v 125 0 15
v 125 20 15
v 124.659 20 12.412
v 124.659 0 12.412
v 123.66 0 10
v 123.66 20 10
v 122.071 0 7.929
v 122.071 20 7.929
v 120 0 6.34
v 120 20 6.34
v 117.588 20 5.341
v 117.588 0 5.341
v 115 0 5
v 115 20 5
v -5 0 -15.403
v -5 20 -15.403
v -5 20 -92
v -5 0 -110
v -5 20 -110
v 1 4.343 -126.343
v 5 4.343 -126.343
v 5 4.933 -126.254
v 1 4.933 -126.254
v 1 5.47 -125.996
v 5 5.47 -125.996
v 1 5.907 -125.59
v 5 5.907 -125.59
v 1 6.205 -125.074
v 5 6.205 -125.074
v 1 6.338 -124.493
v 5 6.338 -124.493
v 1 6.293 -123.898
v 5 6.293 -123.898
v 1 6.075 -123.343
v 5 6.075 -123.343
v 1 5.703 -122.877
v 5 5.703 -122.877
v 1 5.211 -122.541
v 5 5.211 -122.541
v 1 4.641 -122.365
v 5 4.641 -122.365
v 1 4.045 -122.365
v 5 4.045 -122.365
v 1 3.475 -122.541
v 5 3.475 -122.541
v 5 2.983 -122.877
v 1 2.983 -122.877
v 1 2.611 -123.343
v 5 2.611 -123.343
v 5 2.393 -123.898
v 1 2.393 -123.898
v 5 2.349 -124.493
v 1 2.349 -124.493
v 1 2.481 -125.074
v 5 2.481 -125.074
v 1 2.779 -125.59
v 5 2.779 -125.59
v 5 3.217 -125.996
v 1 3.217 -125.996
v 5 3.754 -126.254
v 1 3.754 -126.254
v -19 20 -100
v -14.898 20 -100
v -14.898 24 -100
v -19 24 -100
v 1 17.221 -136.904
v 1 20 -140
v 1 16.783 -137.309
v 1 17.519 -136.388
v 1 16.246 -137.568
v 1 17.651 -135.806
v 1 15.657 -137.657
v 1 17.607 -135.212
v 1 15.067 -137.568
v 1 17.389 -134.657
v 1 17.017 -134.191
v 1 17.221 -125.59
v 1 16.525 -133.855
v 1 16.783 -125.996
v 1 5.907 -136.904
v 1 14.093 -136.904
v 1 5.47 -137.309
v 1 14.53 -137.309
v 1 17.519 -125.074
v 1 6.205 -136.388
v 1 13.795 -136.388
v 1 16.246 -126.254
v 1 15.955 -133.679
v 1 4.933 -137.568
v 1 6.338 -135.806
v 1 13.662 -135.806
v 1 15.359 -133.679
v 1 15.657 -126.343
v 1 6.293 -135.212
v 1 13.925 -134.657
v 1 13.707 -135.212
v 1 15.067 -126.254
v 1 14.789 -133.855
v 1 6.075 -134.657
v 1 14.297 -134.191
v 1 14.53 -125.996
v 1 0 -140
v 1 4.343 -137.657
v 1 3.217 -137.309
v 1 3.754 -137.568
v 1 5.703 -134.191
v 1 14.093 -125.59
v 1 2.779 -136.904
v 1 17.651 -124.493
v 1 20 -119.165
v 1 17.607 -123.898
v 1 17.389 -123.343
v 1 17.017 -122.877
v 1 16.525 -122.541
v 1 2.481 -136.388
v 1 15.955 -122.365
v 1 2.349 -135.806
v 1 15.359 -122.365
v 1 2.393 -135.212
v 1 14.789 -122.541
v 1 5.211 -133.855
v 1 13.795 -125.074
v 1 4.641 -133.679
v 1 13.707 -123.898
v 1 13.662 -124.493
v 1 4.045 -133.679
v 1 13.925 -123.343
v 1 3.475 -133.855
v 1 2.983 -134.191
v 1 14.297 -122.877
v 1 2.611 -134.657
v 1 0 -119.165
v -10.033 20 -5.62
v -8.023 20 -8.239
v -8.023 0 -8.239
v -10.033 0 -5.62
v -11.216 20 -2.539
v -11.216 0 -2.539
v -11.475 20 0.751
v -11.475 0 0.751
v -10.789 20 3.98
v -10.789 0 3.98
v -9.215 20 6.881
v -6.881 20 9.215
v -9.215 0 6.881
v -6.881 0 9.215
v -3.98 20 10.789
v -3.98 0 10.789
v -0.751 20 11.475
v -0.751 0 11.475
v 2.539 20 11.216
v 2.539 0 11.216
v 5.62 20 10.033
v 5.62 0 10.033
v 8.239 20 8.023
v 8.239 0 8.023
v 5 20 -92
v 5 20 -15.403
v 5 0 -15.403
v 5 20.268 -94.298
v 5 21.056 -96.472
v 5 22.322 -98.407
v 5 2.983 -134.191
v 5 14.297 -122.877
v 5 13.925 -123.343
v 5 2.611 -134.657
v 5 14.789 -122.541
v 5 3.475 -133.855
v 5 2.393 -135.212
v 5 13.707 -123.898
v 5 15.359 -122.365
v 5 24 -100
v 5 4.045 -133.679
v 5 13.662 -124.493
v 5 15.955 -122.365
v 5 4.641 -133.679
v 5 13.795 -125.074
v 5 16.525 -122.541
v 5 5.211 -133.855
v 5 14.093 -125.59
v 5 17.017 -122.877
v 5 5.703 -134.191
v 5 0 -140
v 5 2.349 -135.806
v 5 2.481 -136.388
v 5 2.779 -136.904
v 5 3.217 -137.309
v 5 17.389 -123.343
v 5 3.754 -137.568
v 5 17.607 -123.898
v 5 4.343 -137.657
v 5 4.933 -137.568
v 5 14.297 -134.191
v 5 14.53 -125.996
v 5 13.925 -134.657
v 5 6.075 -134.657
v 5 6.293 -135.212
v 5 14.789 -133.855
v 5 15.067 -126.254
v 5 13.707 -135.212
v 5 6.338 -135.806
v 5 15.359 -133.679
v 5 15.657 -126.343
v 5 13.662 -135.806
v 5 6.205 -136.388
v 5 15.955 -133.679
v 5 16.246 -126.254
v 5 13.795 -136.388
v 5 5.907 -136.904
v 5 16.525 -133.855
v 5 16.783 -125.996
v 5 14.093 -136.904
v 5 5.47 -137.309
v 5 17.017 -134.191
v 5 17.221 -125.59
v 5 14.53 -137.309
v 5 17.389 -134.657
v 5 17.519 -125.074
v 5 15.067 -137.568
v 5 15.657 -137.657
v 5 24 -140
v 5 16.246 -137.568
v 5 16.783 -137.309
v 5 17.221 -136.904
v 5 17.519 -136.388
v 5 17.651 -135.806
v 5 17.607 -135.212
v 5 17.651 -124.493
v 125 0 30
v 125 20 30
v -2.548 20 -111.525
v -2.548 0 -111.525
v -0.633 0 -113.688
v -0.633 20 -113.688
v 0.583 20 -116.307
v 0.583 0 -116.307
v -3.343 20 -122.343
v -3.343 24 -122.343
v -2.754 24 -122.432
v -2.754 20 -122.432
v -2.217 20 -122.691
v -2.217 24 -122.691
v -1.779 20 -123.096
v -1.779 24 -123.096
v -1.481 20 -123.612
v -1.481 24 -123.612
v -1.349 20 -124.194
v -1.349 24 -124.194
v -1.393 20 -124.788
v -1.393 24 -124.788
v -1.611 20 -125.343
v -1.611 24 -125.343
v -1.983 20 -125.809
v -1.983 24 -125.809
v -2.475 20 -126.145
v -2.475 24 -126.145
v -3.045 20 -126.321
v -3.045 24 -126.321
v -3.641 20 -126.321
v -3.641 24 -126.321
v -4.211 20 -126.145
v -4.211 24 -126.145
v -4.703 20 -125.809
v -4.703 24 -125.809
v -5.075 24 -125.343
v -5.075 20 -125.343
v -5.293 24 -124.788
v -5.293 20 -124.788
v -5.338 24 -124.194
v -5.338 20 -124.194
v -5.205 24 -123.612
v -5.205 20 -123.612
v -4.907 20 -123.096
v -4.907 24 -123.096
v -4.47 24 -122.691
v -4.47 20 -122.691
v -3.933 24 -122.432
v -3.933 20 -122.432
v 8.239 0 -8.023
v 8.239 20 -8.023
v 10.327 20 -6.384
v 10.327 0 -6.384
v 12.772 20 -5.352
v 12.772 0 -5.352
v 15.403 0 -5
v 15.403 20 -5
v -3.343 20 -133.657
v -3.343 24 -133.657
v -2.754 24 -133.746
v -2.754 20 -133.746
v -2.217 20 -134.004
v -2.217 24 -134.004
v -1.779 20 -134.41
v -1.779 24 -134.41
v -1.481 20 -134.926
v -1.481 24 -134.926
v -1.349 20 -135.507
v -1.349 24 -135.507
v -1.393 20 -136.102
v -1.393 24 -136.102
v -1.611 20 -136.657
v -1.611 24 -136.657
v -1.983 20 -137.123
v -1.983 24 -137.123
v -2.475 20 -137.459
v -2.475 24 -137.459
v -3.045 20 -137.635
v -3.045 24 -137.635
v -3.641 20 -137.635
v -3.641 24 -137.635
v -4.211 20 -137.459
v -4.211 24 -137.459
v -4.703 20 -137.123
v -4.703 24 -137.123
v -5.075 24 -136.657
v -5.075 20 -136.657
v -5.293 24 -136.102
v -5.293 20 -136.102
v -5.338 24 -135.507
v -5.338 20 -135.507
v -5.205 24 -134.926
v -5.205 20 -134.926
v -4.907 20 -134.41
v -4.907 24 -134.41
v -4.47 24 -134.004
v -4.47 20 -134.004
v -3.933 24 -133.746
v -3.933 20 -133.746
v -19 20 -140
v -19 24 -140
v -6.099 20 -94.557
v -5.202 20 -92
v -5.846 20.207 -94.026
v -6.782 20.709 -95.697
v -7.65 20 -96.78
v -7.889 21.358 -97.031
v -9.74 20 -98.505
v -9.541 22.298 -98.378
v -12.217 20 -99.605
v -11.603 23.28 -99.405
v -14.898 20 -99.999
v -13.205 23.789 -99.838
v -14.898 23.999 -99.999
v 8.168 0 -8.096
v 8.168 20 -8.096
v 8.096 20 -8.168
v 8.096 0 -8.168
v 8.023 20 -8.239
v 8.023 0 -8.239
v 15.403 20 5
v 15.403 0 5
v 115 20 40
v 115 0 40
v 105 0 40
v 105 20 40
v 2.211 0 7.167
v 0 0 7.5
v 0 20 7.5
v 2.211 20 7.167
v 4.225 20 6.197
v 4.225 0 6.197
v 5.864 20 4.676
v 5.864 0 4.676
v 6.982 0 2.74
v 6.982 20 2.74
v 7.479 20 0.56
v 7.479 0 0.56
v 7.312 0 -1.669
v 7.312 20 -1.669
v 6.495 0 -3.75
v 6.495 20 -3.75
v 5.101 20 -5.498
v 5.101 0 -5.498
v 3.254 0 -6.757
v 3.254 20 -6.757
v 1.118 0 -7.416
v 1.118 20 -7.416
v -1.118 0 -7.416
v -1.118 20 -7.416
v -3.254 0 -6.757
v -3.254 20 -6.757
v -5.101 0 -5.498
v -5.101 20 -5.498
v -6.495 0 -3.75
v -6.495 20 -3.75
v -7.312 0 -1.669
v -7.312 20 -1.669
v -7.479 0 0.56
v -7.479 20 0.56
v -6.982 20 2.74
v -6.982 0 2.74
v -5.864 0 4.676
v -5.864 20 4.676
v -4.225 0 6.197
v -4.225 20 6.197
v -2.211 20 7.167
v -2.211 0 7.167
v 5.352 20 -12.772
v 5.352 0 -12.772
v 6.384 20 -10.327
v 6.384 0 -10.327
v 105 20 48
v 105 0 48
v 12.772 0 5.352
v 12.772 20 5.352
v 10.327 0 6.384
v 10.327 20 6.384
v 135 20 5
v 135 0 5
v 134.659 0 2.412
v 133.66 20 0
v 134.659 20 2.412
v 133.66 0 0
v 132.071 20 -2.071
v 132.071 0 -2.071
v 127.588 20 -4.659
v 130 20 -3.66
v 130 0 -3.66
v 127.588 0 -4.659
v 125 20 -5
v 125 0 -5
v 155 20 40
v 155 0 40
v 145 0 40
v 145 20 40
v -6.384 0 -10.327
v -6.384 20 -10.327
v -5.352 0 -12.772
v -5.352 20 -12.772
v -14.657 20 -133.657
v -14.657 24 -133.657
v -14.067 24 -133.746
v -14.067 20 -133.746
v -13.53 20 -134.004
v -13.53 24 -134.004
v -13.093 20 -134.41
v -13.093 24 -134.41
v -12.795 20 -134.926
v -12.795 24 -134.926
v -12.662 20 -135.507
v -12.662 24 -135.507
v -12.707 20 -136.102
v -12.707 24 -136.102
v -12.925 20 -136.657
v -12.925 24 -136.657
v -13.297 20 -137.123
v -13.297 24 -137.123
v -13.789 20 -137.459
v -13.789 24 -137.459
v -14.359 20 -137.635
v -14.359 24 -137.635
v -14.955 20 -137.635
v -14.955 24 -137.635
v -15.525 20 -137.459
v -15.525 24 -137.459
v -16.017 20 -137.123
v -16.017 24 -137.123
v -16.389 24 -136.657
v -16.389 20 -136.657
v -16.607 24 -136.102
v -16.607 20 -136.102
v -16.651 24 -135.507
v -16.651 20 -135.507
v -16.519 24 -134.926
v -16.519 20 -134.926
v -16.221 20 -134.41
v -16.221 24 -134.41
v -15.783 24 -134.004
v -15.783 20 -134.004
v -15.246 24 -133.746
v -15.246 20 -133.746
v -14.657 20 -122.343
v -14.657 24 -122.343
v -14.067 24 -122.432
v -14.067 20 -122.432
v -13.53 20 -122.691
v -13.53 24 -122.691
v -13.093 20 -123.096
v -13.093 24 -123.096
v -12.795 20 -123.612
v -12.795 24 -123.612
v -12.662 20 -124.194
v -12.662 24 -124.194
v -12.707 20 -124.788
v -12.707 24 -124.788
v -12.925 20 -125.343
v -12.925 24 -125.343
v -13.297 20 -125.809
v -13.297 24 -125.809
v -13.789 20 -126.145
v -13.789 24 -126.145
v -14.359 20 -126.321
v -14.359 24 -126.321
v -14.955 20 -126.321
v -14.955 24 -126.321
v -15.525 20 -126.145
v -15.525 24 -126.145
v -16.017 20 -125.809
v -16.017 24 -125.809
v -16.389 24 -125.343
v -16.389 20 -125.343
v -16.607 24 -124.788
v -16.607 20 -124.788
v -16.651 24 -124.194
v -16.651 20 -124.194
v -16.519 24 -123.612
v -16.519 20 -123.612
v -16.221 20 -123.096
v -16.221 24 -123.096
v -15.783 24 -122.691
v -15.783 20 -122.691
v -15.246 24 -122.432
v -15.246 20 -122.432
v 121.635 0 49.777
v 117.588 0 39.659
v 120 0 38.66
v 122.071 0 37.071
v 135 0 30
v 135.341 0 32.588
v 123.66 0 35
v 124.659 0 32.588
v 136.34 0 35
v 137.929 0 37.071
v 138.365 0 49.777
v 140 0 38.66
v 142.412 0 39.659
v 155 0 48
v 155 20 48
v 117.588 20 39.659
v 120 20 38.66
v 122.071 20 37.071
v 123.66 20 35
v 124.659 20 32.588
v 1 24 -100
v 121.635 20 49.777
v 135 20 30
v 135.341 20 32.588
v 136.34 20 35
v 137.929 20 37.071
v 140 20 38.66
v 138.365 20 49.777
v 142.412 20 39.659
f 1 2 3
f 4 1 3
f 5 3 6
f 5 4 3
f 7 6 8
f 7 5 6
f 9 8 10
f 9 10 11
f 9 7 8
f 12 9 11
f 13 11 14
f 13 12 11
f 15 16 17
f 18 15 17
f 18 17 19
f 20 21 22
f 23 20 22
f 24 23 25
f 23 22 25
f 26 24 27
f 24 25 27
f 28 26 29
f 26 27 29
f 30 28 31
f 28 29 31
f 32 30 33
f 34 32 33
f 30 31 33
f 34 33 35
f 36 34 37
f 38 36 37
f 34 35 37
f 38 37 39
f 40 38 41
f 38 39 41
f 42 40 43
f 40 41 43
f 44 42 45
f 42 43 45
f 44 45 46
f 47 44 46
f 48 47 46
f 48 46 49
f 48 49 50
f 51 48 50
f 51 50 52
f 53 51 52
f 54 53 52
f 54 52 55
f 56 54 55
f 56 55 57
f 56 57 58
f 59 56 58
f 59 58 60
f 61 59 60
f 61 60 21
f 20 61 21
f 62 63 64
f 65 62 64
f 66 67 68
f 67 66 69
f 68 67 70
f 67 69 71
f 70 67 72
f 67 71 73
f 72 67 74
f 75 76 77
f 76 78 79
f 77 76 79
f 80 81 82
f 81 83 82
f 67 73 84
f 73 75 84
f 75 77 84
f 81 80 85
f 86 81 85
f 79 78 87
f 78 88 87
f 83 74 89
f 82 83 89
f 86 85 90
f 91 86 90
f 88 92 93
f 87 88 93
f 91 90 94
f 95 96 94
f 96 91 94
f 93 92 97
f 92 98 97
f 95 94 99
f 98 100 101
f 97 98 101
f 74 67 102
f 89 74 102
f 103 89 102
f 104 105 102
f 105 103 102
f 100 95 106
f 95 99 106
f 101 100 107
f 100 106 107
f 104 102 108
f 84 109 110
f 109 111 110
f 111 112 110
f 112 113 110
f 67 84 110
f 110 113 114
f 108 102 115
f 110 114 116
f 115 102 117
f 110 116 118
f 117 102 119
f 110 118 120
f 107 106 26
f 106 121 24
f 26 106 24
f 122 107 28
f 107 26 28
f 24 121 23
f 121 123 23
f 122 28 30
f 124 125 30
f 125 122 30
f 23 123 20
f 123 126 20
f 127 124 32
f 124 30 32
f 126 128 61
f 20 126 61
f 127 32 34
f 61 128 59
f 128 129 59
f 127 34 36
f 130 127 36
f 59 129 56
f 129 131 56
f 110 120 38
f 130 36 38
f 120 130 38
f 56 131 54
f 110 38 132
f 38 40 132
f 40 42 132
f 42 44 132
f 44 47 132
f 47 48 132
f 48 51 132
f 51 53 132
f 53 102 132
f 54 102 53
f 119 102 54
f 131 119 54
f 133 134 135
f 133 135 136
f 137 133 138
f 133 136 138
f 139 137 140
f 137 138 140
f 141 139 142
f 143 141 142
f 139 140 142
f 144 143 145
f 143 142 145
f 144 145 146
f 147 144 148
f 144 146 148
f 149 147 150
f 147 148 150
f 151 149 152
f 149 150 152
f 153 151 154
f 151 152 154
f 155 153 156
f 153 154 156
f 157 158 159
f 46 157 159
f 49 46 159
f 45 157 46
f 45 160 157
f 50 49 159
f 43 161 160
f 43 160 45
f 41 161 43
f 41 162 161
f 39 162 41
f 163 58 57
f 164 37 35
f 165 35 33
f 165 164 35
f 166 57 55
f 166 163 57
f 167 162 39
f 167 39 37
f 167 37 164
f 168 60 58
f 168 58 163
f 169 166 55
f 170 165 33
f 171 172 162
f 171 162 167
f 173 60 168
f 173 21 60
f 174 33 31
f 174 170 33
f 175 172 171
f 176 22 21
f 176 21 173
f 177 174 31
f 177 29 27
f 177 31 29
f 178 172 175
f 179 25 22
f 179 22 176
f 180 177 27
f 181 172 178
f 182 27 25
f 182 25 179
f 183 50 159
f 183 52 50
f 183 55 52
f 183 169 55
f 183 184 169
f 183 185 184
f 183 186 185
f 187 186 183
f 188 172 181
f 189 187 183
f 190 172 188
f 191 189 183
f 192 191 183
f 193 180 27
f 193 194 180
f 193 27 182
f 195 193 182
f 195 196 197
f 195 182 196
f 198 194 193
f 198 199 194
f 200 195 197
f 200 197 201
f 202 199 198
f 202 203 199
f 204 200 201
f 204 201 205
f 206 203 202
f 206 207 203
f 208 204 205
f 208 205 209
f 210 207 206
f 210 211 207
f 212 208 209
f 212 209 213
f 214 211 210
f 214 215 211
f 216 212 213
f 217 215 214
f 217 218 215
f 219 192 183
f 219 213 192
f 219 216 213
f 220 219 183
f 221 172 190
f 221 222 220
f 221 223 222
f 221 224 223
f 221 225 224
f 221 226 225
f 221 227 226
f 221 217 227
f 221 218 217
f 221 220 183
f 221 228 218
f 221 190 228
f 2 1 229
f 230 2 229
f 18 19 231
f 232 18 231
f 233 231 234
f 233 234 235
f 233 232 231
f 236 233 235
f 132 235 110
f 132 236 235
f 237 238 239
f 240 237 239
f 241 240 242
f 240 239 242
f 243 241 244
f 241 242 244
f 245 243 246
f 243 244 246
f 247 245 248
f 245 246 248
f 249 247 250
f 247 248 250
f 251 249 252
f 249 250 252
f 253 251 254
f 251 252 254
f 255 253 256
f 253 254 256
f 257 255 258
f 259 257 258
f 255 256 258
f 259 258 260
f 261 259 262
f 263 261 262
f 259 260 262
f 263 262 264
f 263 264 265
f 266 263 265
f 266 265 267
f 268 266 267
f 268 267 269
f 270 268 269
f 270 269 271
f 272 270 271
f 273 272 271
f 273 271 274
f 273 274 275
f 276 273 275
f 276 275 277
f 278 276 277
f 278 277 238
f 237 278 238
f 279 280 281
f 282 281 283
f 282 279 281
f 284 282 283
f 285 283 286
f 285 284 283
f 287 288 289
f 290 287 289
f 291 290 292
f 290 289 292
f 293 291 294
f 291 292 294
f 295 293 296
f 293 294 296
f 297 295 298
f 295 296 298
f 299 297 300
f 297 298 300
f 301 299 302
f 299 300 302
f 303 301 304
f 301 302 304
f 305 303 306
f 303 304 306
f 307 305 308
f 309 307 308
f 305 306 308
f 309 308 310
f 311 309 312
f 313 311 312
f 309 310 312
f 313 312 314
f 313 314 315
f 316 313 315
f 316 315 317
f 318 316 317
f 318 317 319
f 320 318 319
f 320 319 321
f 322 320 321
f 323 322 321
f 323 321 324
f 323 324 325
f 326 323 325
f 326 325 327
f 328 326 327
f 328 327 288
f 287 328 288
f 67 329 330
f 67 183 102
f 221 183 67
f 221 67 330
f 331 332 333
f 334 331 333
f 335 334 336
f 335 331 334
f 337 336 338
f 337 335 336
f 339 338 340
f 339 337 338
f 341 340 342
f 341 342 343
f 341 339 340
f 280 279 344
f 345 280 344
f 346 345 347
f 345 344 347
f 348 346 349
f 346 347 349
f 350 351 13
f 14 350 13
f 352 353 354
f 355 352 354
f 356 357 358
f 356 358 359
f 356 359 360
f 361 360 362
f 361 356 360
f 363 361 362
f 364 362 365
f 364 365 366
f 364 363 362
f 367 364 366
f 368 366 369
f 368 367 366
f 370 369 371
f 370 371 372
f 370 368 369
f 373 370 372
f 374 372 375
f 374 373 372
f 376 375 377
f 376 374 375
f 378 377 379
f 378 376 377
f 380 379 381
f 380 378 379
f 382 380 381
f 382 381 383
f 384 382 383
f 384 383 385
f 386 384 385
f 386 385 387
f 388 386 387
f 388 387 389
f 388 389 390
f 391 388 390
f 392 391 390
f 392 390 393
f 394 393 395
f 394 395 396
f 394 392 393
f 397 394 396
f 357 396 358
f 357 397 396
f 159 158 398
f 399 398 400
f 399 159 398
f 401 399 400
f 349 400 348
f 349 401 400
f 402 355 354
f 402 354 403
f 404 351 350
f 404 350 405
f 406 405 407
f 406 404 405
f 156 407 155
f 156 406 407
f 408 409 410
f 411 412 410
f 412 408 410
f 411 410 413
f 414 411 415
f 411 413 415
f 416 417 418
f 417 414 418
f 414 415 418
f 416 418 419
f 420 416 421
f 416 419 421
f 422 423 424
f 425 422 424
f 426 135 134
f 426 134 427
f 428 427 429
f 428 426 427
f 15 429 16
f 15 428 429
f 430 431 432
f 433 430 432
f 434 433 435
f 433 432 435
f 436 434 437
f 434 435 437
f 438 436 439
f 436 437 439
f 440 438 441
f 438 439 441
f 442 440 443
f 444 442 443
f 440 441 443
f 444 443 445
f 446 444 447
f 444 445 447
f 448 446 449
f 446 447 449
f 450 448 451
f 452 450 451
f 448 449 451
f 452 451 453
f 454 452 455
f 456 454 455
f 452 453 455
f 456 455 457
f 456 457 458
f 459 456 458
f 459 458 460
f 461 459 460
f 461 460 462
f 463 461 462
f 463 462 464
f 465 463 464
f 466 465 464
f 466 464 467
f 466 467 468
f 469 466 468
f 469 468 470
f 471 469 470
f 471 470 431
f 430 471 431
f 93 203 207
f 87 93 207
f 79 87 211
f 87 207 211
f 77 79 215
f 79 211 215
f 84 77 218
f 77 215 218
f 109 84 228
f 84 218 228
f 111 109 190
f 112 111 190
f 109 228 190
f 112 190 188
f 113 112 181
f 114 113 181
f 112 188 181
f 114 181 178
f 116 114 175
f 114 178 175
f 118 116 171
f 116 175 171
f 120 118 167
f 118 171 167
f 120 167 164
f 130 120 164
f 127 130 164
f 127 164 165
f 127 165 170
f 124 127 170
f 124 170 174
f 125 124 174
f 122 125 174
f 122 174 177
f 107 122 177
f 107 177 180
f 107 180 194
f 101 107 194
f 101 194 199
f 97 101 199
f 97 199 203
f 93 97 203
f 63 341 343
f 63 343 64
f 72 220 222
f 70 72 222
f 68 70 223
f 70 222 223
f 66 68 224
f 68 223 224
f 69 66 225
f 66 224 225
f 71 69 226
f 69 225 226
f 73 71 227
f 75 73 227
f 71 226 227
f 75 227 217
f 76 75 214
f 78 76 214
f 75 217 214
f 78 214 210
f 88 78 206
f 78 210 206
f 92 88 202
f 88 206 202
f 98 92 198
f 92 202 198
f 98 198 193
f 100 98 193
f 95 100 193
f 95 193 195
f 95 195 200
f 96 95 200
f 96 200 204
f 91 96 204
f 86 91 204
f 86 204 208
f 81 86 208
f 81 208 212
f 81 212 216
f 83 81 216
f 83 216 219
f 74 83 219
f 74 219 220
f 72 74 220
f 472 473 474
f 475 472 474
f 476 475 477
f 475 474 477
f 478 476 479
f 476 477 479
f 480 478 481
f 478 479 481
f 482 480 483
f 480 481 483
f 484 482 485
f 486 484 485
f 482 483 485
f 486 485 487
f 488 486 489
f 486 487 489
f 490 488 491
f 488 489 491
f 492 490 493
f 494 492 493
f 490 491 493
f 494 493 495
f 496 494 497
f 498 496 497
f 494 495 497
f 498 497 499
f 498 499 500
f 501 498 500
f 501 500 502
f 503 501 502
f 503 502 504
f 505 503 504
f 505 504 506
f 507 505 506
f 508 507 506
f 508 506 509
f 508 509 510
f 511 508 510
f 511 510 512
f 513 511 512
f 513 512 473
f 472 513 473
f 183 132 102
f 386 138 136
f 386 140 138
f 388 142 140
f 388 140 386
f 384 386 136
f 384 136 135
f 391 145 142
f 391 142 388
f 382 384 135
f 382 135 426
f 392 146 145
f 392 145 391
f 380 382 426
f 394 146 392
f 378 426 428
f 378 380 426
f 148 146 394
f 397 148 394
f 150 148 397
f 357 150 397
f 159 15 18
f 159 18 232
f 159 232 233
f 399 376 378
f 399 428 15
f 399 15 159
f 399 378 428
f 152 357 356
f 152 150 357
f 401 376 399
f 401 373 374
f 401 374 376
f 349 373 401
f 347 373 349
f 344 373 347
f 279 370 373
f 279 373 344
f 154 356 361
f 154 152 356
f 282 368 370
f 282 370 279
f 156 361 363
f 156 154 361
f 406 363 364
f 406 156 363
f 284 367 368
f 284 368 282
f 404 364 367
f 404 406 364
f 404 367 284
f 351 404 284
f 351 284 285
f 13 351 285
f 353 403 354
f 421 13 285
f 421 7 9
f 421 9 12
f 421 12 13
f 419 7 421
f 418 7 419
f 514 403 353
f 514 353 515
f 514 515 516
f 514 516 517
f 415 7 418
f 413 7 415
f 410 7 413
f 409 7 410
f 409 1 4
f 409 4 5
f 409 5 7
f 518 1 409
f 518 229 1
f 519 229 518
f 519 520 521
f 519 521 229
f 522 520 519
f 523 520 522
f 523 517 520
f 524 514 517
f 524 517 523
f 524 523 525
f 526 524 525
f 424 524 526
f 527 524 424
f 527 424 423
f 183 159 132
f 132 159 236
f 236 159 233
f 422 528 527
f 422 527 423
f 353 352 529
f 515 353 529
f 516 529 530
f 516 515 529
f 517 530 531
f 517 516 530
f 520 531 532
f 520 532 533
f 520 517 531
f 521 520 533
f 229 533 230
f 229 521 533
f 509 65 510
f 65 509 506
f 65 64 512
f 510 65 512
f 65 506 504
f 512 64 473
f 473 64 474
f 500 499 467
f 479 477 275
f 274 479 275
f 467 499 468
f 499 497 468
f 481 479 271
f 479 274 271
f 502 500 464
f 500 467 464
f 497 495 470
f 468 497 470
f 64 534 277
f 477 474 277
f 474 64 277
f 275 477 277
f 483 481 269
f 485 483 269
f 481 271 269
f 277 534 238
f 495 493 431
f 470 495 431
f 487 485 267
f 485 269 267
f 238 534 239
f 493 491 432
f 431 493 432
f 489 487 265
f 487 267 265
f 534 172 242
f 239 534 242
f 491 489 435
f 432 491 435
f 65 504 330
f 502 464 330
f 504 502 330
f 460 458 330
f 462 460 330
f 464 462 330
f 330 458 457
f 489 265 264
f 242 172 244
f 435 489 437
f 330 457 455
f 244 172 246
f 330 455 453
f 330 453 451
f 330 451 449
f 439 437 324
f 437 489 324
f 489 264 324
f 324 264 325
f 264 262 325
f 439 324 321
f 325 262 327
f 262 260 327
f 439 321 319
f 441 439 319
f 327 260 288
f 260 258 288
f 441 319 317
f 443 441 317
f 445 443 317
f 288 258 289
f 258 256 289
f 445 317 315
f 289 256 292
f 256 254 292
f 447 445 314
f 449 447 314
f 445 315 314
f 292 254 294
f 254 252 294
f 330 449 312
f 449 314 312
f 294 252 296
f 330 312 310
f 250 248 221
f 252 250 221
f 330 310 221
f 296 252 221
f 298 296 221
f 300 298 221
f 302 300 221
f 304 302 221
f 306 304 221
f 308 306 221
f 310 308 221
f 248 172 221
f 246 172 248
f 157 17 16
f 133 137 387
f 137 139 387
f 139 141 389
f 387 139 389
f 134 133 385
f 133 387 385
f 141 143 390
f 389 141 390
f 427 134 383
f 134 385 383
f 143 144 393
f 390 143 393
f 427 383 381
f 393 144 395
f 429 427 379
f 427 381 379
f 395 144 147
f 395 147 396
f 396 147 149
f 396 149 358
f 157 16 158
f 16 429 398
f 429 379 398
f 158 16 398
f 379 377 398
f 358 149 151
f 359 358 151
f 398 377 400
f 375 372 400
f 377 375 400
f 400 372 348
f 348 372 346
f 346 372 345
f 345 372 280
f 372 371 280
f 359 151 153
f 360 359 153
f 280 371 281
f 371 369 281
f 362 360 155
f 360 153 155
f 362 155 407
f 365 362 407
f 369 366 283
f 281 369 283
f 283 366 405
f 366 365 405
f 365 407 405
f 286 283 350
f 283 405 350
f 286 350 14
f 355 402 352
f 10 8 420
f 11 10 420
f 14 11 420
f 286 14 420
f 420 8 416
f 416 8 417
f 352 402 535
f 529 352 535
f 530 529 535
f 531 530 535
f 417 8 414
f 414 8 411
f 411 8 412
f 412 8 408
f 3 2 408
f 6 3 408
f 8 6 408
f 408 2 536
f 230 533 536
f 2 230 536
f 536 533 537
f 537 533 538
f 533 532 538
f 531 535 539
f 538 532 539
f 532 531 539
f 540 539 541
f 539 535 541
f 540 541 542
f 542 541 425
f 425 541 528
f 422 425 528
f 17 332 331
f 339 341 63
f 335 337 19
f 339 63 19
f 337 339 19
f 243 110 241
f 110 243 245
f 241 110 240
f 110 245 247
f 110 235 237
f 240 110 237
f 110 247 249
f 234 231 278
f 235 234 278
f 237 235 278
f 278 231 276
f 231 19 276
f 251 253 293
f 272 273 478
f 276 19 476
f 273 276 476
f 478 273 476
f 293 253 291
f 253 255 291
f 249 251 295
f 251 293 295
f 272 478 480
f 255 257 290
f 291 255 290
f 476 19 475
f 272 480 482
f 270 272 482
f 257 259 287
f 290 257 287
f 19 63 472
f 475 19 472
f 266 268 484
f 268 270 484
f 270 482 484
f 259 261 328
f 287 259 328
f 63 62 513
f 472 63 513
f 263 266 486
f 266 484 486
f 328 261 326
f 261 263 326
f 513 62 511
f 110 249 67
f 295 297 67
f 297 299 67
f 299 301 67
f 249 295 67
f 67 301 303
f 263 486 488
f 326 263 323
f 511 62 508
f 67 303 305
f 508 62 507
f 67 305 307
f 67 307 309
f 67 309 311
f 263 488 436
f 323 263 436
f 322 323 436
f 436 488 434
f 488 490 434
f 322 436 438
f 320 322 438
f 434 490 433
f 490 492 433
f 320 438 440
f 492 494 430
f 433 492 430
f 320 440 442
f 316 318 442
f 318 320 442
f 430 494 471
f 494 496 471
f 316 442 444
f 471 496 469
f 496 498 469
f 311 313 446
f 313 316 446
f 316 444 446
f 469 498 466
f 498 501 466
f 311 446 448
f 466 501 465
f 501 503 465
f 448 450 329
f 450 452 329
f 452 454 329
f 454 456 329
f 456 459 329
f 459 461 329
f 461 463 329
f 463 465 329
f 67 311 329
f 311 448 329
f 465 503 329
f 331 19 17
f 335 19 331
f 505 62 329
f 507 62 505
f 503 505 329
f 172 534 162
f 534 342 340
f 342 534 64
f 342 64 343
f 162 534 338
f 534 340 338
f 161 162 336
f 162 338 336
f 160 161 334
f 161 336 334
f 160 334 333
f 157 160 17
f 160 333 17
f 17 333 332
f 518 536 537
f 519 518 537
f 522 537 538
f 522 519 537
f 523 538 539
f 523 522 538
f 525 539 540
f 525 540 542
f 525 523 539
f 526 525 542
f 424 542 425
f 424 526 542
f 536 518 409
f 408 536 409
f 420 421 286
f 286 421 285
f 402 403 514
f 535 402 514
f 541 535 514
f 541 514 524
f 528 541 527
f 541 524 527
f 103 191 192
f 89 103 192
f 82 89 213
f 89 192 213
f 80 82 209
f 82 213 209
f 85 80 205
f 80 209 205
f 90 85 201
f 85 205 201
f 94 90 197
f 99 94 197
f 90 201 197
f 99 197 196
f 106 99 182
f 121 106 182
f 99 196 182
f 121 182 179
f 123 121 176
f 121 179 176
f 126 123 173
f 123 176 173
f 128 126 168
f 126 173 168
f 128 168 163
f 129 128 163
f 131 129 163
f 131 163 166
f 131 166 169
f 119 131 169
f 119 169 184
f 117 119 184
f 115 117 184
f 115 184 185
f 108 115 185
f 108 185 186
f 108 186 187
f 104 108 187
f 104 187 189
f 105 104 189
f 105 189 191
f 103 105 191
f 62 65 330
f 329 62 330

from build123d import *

# Parameters (mm, degrees)
SKETCH1_R           = 7.5
BOSS_EXTRUDE1_DEPTH = 20
CUT_EXTRUDE1_REACH  = 208.155
SKETCH2_R           = 2
FILLET1_R           = 10
SKETCH3_W           = 40
SKETCH3_H           = 4
BOSS_EXTRUDE2_DEPTH = 24
CUT_EXTRUDE2_REACH  = 212.24
SKETCH4_R           = 2
FILLET3_R           = 10
FILLET4_START       = -5.202040929
FILLET4_DEPTH       = 6.202040929
FILLET4_START_2     = -14.898418687
FILLET4_2_DEPTH     = 9.696377758
FILLET4_START_3     = 20
FILLET4_3_DEPTH     = 5


with BuildPart() as part:
    # Sketch1 → Boss-Extrude1 (new body)
    with BuildSketch(Plane(origin=(0, 0, 0), x_dir=(1, 0, 0), z_dir=(0, 1, 0))):
        with BuildLine():
            Line((10.356157589, -5), (125, -5))
            Line((125, -5), (125, -40))
            Line((125, -40), (105, -40))
            Line((105, -40), (105, -48))
            ThreePointArc((105, -48), (130, -50), (155, -48))
            Line((155, -48), (155, -40))
            Line((155, -40), (135, -40))
            Line((135, -40), (135, 5))
            Line((135, 5), (10.356157589, 5))
            ThreePointArc((10.356157589, 5), (8.131727984, 8.131727984), (5, 10.356157589))
            Line((5, 10.356157589), (5, 140))
            Line((5, 140), (1, 140))
            Line((1, 140), (1, 110))
            Line((1, 110), (-5, 110))
            Line((-5, 110), (-5, 10.356157589))
            ThreePointArc((-5, 10.356157589), (-8.131727984, -8.131727984), (10.356157589, -5))
        make_face()
        with Locations(Location((0, 0, 0), (0, 0, 270))):
            Circle(SKETCH1_R, mode=Mode.SUBTRACT)
    extrude(amount=BOSS_EXTRUDE1_DEPTH)

    # Sketch2 → Cut-Extrude1 (cut, up to next)
    with BuildSketch(Plane(origin=(5, 0, 0), x_dir=(0, 0, -1), z_dir=(1, 0, 0)), mode=Mode.PRIVATE) as cut_extrude1_sk1:
        with Locations((135.656854249, 4.343145751)):
            Circle(SKETCH2_R)
    cut_extrude1_tool1 = extrude(cut_extrude1_sk1.sketch, amount=-CUT_EXTRUDE1_REACH, mode=Mode.PRIVATE) & part.part
    # Sketch2 → Cut-Extrude1 (cut, up to next)
    with BuildSketch(Plane(origin=(5, 0, 0), x_dir=(0, 0, -1), z_dir=(1, 0, 0)), mode=Mode.PRIVATE) as cut_extrude1_sk2:
        with Locations((124.343145751, 4.343145751)):
            Circle(SKETCH2_R)
    cut_extrude1_tool2 = extrude(cut_extrude1_sk2.sketch, amount=-CUT_EXTRUDE1_REACH, mode=Mode.PRIVATE) & part.part
    # Sketch2 → Cut-Extrude1 (cut, up to next)
    with BuildSketch(Plane(origin=(5, 0, 0), x_dir=(0, 0, -1), z_dir=(1, 0, 0)), mode=Mode.PRIVATE) as cut_extrude1_sk3:
        with Locations((124.343145751, 15.656854249)):
            Circle(SKETCH2_R)
    cut_extrude1_tool3 = extrude(cut_extrude1_sk3.sketch, amount=-CUT_EXTRUDE1_REACH, mode=Mode.PRIVATE) & part.part
    # Sketch2 → Cut-Extrude1 (cut, up to next)
    with BuildSketch(Plane(origin=(5, 0, 0), x_dir=(0, 0, -1), z_dir=(1, 0, 0)), mode=Mode.PRIVATE) as cut_extrude1_sk4:
        with Locations((135.656854249, 15.656854249)):
            Circle(SKETCH2_R)
    cut_extrude1_tool4 = extrude(cut_extrude1_sk4.sketch, amount=-CUT_EXTRUDE1_REACH, mode=Mode.PRIVATE) & part.part
    add(cut_extrude1_tool1.solids().sort_by_distance((5, 4.343146, -135.656854))[0], mode=Mode.SUBTRACT)
    add(cut_extrude1_tool2.solids().sort_by_distance((5, 4.343146, -124.343146))[0], mode=Mode.SUBTRACT)
    add(cut_extrude1_tool3.solids().sort_by_distance((5, 15.656854, -124.343146))[0], mode=Mode.SUBTRACT)
    add(cut_extrude1_tool4.solids().sort_by_distance((5, 15.656854, -135.656854))[0], mode=Mode.SUBTRACT)

    # Fillet1
    # the kernel refuses this fillet: 10 mm, written as the material it adds along each edge
    with BuildSketch(Plane(origin=(1, 0, -110), x_dir=(0, 0, -1), z_dir=(0, 1, 0))) as fillet1_piece_1:
        with BuildLine():
            CenterArc((9.16515139, 10), FILLET1_R, 203.578178478, 66.421821522)
            Line((0, 6), (0, 0))
            Line((0, 0), (9.16515139, 0))
        make_face()
    extrude(amount=20)
    with BuildSketch(Plane(origin=(125, 0, 40), x_dir=(0, 0, -1), z_dir=(0, 1, 0)), Plane(origin=(135, 0, 40), x_dir=(1, 0, 0), z_dir=(0, 1, 0)), Plane(origin=(125, 0, 5), x_dir=(-1, 0, 0), z_dir=(0, 1, 0))) as fillet1_piece_2:
        with BuildLine():
            CenterArc((FILLET1_R, FILLET1_R), FILLET1_R, 180, 90)
            Line((0, FILLET1_R), (0, 0))
            Line((0, 0), (FILLET1_R, 0))
        make_face()
    extrude(amount=20)
    with BuildSketch(Plane(origin=(10.356157589, 0, 5), x_dir=(1, 0, 0), z_dir=(0, 1, 0))) as fillet1_piece_3:
        with BuildLine():
            CenterArc((5.046764212, -10), FILLET1_R, 90, 45.75928121)
            ThreePointArc((-2.117385463, -3.023255814), (-0.936610269, -1.597130308), (0, 0))
            Line((0, 0), (5.046764212, 0))
        make_face()
    extrude(amount=20)
    with BuildSketch(Plane(origin=(10.356157589, 0, -5), x_dir=(1, 0, 0), z_dir=(0, 1, 0))) as fillet1_piece_4:
        with BuildLine():
            CenterArc((5.046764212, 10), FILLET1_R, 224.24071879, 45.75928121)
            ThreePointArc((-2.117385463, 3.023255814), (-0.936610269, 1.597130308), (0, 0))
            Line((0, 0), (5.046764212, 0))
        make_face()
    extrude(amount=20)
    with BuildSketch(Plane(origin=(5, 0, -10.356157589), x_dir=(0.8190910712491061, 0, 0.5736635050271124), z_dir=(0, 1, 0))) as fillet1_piece_5:
        with BuildLine():
            CenterArc((5.295766266, 9.870394555), FILLET1_R, 215.006090265, 45.75928121)
            Line((-2.895144447, 4.133759505), (0, 0))
            ThreePointArc((0, 0), (1.845494305, 0.149046262), (3.690988609, 0))
        make_face()
    extrude(amount=20)
    with BuildSketch(Plane(origin=(-5, 0, -10.356157589), x_dir=(-0.8190910712491065, 0, 0.5736635050271119), z_dir=(0, 1, 0))) as fillet1_piece_6:
        with BuildLine():
            CenterArc((5.295766266, -9.870394555), FILLET1_R, 99.234628525, 45.75928121)
            Line((-2.895144447, -4.133759505), (0, 0))
            ThreePointArc((0, 0), (1.845494305, -0.149046262), (3.690988609, 0))
        make_face()
    extrude(amount=20)
    # the kernel refuses this fillet: 10 mm, written as the material it takes off along each edge
    with BuildSketch(Plane(origin=(135, -25, -5), x_dir=(0, 0, 1), z_dir=(0, 1, 0))) as fillet1_2_piece_1:
        with BuildLine():
            CenterArc((FILLET1_R, -FILLET1_R), FILLET1_R, 90, 90)
            Line((0, -FILLET1_R), (0, 0))
            Line((0, 0), (FILLET1_R, 0))
        make_face()
    extrude(amount=70, mode=Mode.SUBTRACT)

    # Sketch3 → Boss-Extrude2 (add)
    with BuildSketch(Plane(origin=(5, 0, 0), x_dir=(0, 0, -1), z_dir=(1, 0, 0))):
        with Locations((120, 22)):
            Rectangle(SKETCH3_W, SKETCH3_H)
    extrude(amount=-BOSS_EXTRUDE2_DEPTH)

    # Sketch4 → Cut-Extrude2 (cut, up to next)
    with BuildSketch(Plane(origin=(0, 24, 0), x_dir=(1, 0, 0), z_dir=(0, 1, 0)), mode=Mode.PRIVATE) as cut_extrude2_sk1:
        with Locations(Location((-3.343145751, 135.656854249, 0), (0, 0, 270))):
            Circle(SKETCH4_R)
    cut_extrude2_tool1 = extrude(cut_extrude2_sk1.sketch, amount=-CUT_EXTRUDE2_REACH, mode=Mode.PRIVATE) & part.part
    # Sketch4 → Cut-Extrude2 (cut, up to next)
    with BuildSketch(Plane(origin=(0, 24, 0), x_dir=(1, 0, 0), z_dir=(0, 1, 0)), mode=Mode.PRIVATE) as cut_extrude2_sk2:
        with Locations(Location((-14.656854249, 135.656854249, 0), (0, 0, 270))):
            Circle(SKETCH4_R)
    cut_extrude2_tool2 = extrude(cut_extrude2_sk2.sketch, amount=-CUT_EXTRUDE2_REACH, mode=Mode.PRIVATE) & part.part
    # Sketch4 → Cut-Extrude2 (cut, up to next)
    with BuildSketch(Plane(origin=(0, 24, 0), x_dir=(1, 0, 0), z_dir=(0, 1, 0)), mode=Mode.PRIVATE) as cut_extrude2_sk3:
        with Locations(Location((-14.656854249, 124.343145751, 0), (0, 0, 270))):
            Circle(SKETCH4_R)
    cut_extrude2_tool3 = extrude(cut_extrude2_sk3.sketch, amount=-CUT_EXTRUDE2_REACH, mode=Mode.PRIVATE) & part.part
    # Sketch4 → Cut-Extrude2 (cut, up to next)
    with BuildSketch(Plane(origin=(0, 24, 0), x_dir=(1, 0, 0), z_dir=(0, 1, 0)), mode=Mode.PRIVATE) as cut_extrude2_sk4:
        with Locations(Location((-3.343145751, 124.343145751, 0), (0, 0, 270))):
            Circle(SKETCH4_R)
    cut_extrude2_tool4 = extrude(cut_extrude2_sk4.sketch, amount=-CUT_EXTRUDE2_REACH, mode=Mode.PRIVATE) & part.part
    add(cut_extrude2_tool1.solids().sort_by_distance((-3.343146, 24, -135.656854))[0], mode=Mode.SUBTRACT)
    add(cut_extrude2_tool2.solids().sort_by_distance((-14.656854, 24, -135.656854))[0], mode=Mode.SUBTRACT)
    add(cut_extrude2_tool3.solids().sort_by_distance((-14.656854, 24, -124.343146))[0], mode=Mode.SUBTRACT)
    add(cut_extrude2_tool4.solids().sort_by_distance((-3.343146, 24, -124.343146))[0], mode=Mode.SUBTRACT)

    # Fillet3
    # the kernel refuses this fillet: 10 mm, written as the material it adds along each edge
    with BuildSketch(Plane(origin=(5, 20, -100), x_dir=(0, 0, 1), z_dir=(-1, 0, 0))) as fillet3_piece_1:
        with BuildLine():
            CenterArc((8, 10), FILLET3_R, 216.869897646, 53.130102354)
            Line((0, 4), (0, 0))
            Line((0, 0), (8, 0))
        make_face()
    extrude(amount=10)

    # Fillet4: read off the stored shape, not the designer's step
    # Fillet4 outline → Fillet4 (add)
    with BuildSketch(Plane.YZ.offset(FILLET4_START)):
        with BuildLine():
            Line((20, -92), (20, -100))
            Line((20, -100), (24.000002869, -100.000002152))
            ThreePointArc((24.000002869, -100.000002152), (21.055728892, -96.472137559), (20, -92))
        make_face()
    extrude(amount=FILLET4_DEPTH)

    # Fillet4 2 outline → Fillet4 2 (add)
    with BuildSketch(Plane.YZ.offset(FILLET4_START_2)):
        with BuildLine():
            ThreePointArc((24.000002869, -100.000002152), (21.055728892, -96.472137559), (20, -92))
            Line((20, -92), (20, -100))
            Line((20, -100), (24.000002869, -100.000002152))
        make_face()
    extrude(amount=FILLET4_2_DEPTH)

    # Fillet4 3 outline → Fillet4 3 (cut)
    with BuildSketch(Plane(origin=(0, 0, 0), x_dir=(1, 0, 0), z_dir=(0, 1, 0)).offset(FILLET4_START_3)):
        with BuildLine():
            Line((-4.793792738, 90), (-5.202041029, 92))
            ThreePointArc((-5.202041029, 92), (-8.636183479, 97.713743532), (-14.898418687, 99.999484049))
            Line((-14.898418687, 99.999484049), (-14.898418687, 90))
            Line((-14.898418687, 90), (-4.793792738, 90))
        make_face()
    extrude(amount=FILLET4_3_DEPTH, mode=Mode.SUBTRACT)


solid = part.part
